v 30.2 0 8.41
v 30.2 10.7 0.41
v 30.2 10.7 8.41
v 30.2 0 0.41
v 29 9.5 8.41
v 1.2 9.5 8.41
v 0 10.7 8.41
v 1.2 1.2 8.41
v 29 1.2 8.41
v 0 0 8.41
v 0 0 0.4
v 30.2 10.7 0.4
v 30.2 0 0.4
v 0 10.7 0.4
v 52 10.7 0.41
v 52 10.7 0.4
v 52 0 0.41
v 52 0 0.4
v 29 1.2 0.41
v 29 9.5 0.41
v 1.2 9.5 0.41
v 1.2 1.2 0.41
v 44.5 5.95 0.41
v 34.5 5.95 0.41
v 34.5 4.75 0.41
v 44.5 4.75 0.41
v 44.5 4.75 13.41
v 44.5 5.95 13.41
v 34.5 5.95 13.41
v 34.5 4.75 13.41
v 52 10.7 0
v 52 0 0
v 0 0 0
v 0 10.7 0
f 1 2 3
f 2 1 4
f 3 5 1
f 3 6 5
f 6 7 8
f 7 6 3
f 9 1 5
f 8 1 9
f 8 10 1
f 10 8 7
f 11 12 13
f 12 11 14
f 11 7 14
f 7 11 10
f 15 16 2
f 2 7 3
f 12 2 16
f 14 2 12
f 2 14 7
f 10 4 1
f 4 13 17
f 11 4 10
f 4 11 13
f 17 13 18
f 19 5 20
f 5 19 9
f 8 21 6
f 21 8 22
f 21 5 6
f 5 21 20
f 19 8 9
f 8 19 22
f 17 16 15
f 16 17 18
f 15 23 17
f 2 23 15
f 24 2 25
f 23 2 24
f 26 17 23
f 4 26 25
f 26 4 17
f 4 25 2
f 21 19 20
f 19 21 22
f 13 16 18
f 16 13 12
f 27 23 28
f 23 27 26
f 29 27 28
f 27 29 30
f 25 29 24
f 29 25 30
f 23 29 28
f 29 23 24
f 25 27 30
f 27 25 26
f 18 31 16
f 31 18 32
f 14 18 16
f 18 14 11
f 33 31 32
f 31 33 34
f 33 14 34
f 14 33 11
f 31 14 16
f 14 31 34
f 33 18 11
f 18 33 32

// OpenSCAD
// file: ../../Base/Rotation.scad
// Fischertechnik Box Foundation
// Geometry Helpers Rotation

include <PlacementOptions.scad>

// getRotatedSpace(space, rotation=NoRotation)
// Rotates the space dependent on the specified rotation

function getRotatedSpace(space, rotation=NoRotation) = [
    (rotation == Rotate90 || rotation == Rotate270) ? space.y : space.x,
    (rotation == Rotate90 || rotation == Rotate270) ? space.x : space.y
];

// Rotates the given space around the fixed left lower corner
// space = the space the children needs as width/depth list [width,depth]
// rotation = 0 Rotate0 degrees, 1 Rotate90 degrees, 2 Rotate180 degrees, 3 Rotate270 degrees (equivalent to -90)

module RotateFix(space, rotation=NoRotation) {
    dy = (rotation == Rotate0 || rotation == Rotate270) ? 0 :
        (rotation == Rotate90) ? space.x :
        space.y;
    dx = (rotation < Rotate180) ? 0 :
        (rotation == Rotate180) ? space.x :
        space.y;
    
    translate([dx, dy, 0])
        rotate([0, 0, rotations[rotation]])
            children();
}
// file: ../../Base/Alignment.scad
// Fischertechnik Box Foundation
// Geometry Helpers Alignment

include <PlacementOptions.scad>

// getAlignedX(elementWidth, spaceWidth, align=AlignRight, offset=0)
// Gets the aligned X offset of an element with the given
// width in the given space.
// elementWidth = The width of the element to positon
// spaceWidth = The space where the element should be aligned
// align = 0 AlignLeft, 1 AlignCenter, 2 AlignRight
// offset = an optional offset from the aligned position. When
// aligned left or centered, then positive values are in X direction.
// When aligned right then positive values are in negative X direction.

function getAlignedX(elementWidth, spaceWidth, align=AlignRight, offset=0) =
    (align == AlignLeft) ?
        offset :
        ((align == AlignCenter) ?
        (spaceWidth - elementWidth)/2 + offset :
        spaceWidth - offset - elementWidth);

// getAlignedY(elementDepth, spaceDepth, align=AlignTop, offset=0)
// Gets the aligned Y offset of an element with the given
// depth in the given space.
// elementDepth = The depth of the element to positon
// spaceDepth = The space where the element should be aligned
// align = 0 AlignBottom, 1 AlignCenter, 2 AlignTop
// offset = an optional offset from the aligned position. When
// aligned bottom or centered, then positive values are in Y direction.
// When aligned top then positive values are in negative Y direction.

function getAlignedY(elementDepth, spaceDepth, align=AlignTop, offset=0) =
    (align == AlignBottom) ?
        offset :
        ((align == AlignCenter) ?
        (spaceDepth - elementDepth)/2 + offset :
        spaceDepth - offset - elementDepth);
// file: ../../Base/Boxes.scad
// Fischertechnik Box Foundation
// Pre-designed Boxes

use <Constants.scad>

include <PlacementOptions.scad>

box190Width = 190;
box190Depth = 130;
box130Width = 130;
box130Depth = 95;

// Values are from an original ec3 box
topBottomDifference = 1.5;
outerHeight = 40;
innerHeight = 38.2;
baseThickness = outerHeight - innerHeight;
stackExcess = 5.7;
radius = 3.5;
wallThickness = 1.5;
tolerance = 0.2;
stackOffset = innerHeight - stackExcess;

boxUsageHeight = stackOffset;
boxWallThickness = wallThickness;
boxBaseThickness = baseThickness;
boxWebWidth = 3.0;

// getBoxWallThickness()
// Gets the wall thickness of a Fischertechnik Box
function getBoxWallThickness() = boxWallThickness;

// getBoxUsageHeight()
// Gets the usable height of a Fischertechnik box
function getBoxUsageHeight() = boxUsageHeight;

// getBoxInnerHeight()
// Gets the inner height of a Fischertechnik box, including the stack excess
function getBoxInnerHeight() = innerHeight;

// getBoxBaseThickness()
// Gets the thickness of the Fischertechnik box base.
function getBoxBaseThickness() = boxBaseThickness;

// getBoxWebWidth()
// Gets the width of a box web
function getBoxWebWidth() = boxWebWidth;

// getBox190Space()
// Gets the usable inner space of a Box 190 as an x/y-list
function getBox190Space() = [
    box190Width - 2*getBoxWallThickness() - topBottomDifference, 
    box190Depth - 2*getBoxWallThickness() - topBottomDifference ];

// BoxBase(width, depth)
// Creates an empty stackable Fischertechnik compatible box
// width = Outer width of the box (190, 130, ...)
// depth = Outer depth of the box (130, 95, ...)

module BoxBase(width, depth, height=outerHeight) {    
    thinPlate = 0.01;

    innerHeight = height - baseThickness;    
    
    module BodyPlate(width, depth) {
        translate([radius, radius])
        hull() {
            w = width-2*radius;
            d = depth-2*radius;
            cube([w, d, thinPlate]);
            cylinder(thinPlate, r=radius, $fn=getFragments());
            translate([w, 0])
                cylinder(thinPlate, r=radius, $fn=getFragments());
            translate([w, d])
                cylinder(thinPlate, r=radius, $fn=getFragments());
            translate([0, d])
                cylinder(thinPlate, r=radius, $fn=getFragments());
        }
    }
    
    module Body(tolerance=tolerance) {
        hull() {
            // Bottom with tolerance to fit into the original boxes when stacked
            translate([-wallThickness+tolerance, -wallThickness+tolerance, -baseThickness])
                BodyPlate(width-topBottomDifference-2*tolerance, depth-topBottomDifference-2*tolerance);
            
            // Top
            translate([-wallThickness-topBottomDifference/2, -wallThickness-topBottomDifference/2, innerHeight-thinPlate])
                BodyPlate(width, depth);
         }
    }

    module Cutoff() {
        hull() {
            coWidth = width - 2*wallThickness;
            coDepth = depth - 2*wallThickness;
            
            // Bottom
            BodyPlate(coWidth-topBottomDifference, coDepth-topBottomDifference);

            // Top
            translate([-topBottomDifference/2, -topBottomDifference/2, innerHeight+thinPlate]) 
                BodyPlate(coWidth, coDepth);
        }
    }
    
    difference() {        
        Body();
        Cutoff();
        stackOffset = innerHeight - stackExcess;
        translate([0, 0, stackOffset + baseThickness])
            Body(tolerance=0);
    }
}

// Creates the Fischertechnik empty box 130x190 mm and places it at position 0,0
// 190x130 are the outer sizes, the inner space is slightly smaller. Use getBox190Space() to get the inner sizes.
// The box is positioned that the usable inner space is at the 0,0,0 position. The

module Box190() {
    BoxBase(box190Width, box190Depth);
}

// Gets the usable inner space of a Box 130 as an x/y-list
function getBox130Space() = [
    box130Width - 2*getBoxWallThickness() - topBottomDifference, 
    box130Depth - 2*getBoxWallThickness() - topBottomDifference ];

// Creates the Fischertechnik empty box 95x130 mm and places it at position 0,0
// 190x130 are the outer sizes, the inner space is slightly smaller. Use getBox190Space() to get the inner sizes.
// The box is positioned that the usable inner space is at the 0,0,0 position. The

module Box130() {
    BoxBase(box130Width, box130Depth);
}

// Creates a web at the specified box walls
// corner 0 = LowerLeft, 1 = UpperLeft, 2 = UpperRight, 3 = LowerRight
// side 0 = LeftOfCorner, 1 = RightOfCorner
// distance = Distance in mm from the corner
// boxSpace = inner width and depth of the box (default: Box 190)
// webWidth = length of the web (default is 3 mms)
// webThickness = thickness of the web (default is 1 mm)

module BoxWeb(corner, side, distance, boxSpace=getBox190Space(), webWidth=getBoxWebWidth(), webThickness=1.0) {
    sink = getBoxWallThickness()/2;

    width = (corner % 2 == 0) ? 
            (side == LeftOfCorner ? webWidth : webThickness) :
            (side == LeftOfCorner ? webThickness : webWidth);

    depth = (corner % 2 == 0) ? 
            (side == RightOfCorner ? webWidth : webThickness) :
            (side == RightOfCorner ? webThickness : webWidth);
    
    xDiff = corner == LowerLeft ? 
                (side == LeftOfCorner ? -sink : distance) :
            (corner == UpperLeft ?                
                (side == LeftOfCorner ? distance : -sink) :
            (corner == UpperRight ?
                (side == LeftOfCorner ? boxSpace.x-webWidth+sink : boxSpace.x-distance-webThickness) :
                (side == LeftOfCorner ? boxSpace.x-distance-webThickness: boxSpace.x-webWidth+sink)));

    yDiff = corner == LowerLeft ? 
                (side == RightOfCorner ? -sink : distance) :
            (corner == UpperLeft ?
                (side == RightOfCorner ? boxSpace.y-distance : boxSpace.y-webWidth+sink) :
            (corner == UpperRight ?
                (side == RightOfCorner ? boxSpace.y-webWidth+sink : boxSpace.y-distance) :
                (side == RightOfCorner ? distance : -sink)));
    
    translate([xDiff, yDiff, -getExcess()])
        cube([width, depth, boxUsageHeight + 2*getExcess()]);
}
// file: ../../Base/PlacementOptions.scad
// Fischertechnik Box Foundation
// Placement Options

// Alignment
NoAlign = 0;
AlignLeft = 1;
AlignBottom = 2;
AlignCenter = 3;
AlignRight = 4;
AlignTop = 5;

// Element rotation degree steps
rotations = [0, -90, -180, -270];

// Rotation
NoRotation = 0;
Rotate0 = 0;
Rotate90 = 1;
Rotate180 = 2;
Rotate270 = 3;

// Docking (seen from above)
NoDock = -1;
DockLeft = 0;
DockTop = 1;
DockRight = 2;
DockCorner = 2;
DockBottom = 3;

// Web corners
LowerLeft = 0;
UpperLeft = 1;
UpperRight = 2;
LowerRight = 3;

// Web position relative to corner
LeftOfCorner = 0;
RightOfCorner = 1;
// file: ../../Base/Placement.scad
// Fischertechnik Box Foundation
// Geometry Helpers Placement

use <Constants.scad>
use <Alignment.scad>
use <Rotation.scad>
use <Boxes.scad>

include <PlacementOptions.scad>

// Place(x=0, y=0, elementSpace=[0,0], alignX=AlignLeft, alignY=AlignBottom, rotation=Rotate0, boxSpace=getBox190Space())
// Places the child at the specified position
// y = Y-Position. This is a relative position when an X aligment is specified.
// x = X-Position. This is a relative position when an Y aligment is specified.
// elementSpace = space of the element to be placed [x,y]
// alignX = -1=NoAlign, 0 AlignLeft, 1 AlignCenter, 3 AlignRight (elementSpace and boxSpace required!)
// alignY = -1=NoAlign, 2 AlignBottom, 1 AlignCenter, 4 AlignTop (elementSpace and boxSpace required!)
// rotation = 0 Rotate0 0 degrees, 1 Rotate90 90 degrees, 
// 2 Rotate180 180 degrees, 3 Rotate270 270 degrees (equivalent to -90)
// boxSpace = Inner space of the box where the placement occurs [x,y] - default is Box 190x130 inner space

module Place(x=0, y=0, elementSpace=[0,0], 
  alignX=AlignLeft, alignY=AlignBottom, 
  rotation=NoRotation, boxSpace=getBox190Space()) {

    module Position(x, y, space, rotation=Rotate0) {
        translate([x, y, 0])
            RotateFix(space, rotation)
                children();
    }

    space = getRotatedSpace(elementSpace, rotation);
    alignedX = getAlignedX(space.x, boxSpace.x, alignX, x);
    alignedY = getAlignedY(space.y, boxSpace.y, alignY, y);
    Position(alignedX, alignedY, elementSpace, rotation)
        children();
}

// Center(space=getBox130Space(), elementSpace=[0,0])
// space = Space where the children is centered. For cylinder use centered=true and no elementSpace.
// elementSpace = space of the element to be centered [x,y]

module Center(space=getBox190Space(), elementSpace=[0,0]) {
    Place(elementSpace=elementSpace, boxSpace=space, alignX=AlignCenter, alignY=AlignCenter)
        children();
}

// CenterHorizontal(width=0, y=0, offset=0, space=getBox130Space())
// width = Width of the element to be placed.
// y = Y position of the element
// offset = Offset from the center position (negative will be left of the center)
// space = Space where the element is placed

module CenterHorizontal(width=0, y=0, offset=0, space=getBox190Space()) {
    Place(x=offset, y=y, elementSpace=[width, 0], boxSpace=space, alignX=AlignCenter)
        children(0);
}

// CenterVertical(depth=0, x=0, offset=0, space=getBox130Space())
// depth = Depth of the element to be placed.
// x = X position of the element
// offset = Offset from the center position (negative will be down of the center)
// space = Space where the element is placed

module CenterVertical(depth=0, x=0, offset=0, space=getBox190Space()) {
    Place(x=x, y=offset, elementSpace=[0, depth], boxSpace=space, alignY=AlignCenter)
        children(0);
}

// getIsVertical(align)
// True if the specified alignment needs a vertical orientation for a divider (AlignRight, AlignLeft)

function getIsVertical(align) = (align == AlignRight || align == AlignLeft);

// getIsHorizontal(align)
// True if the specified alignment needs a horizontal orientation for a divider (AlignTop, AlignBottom)

function getIsHorizontal(align) = (align == AlignTop || align == AlignBottom);
// file: ../../Elements/AxisClip10.scad
// Fischertechnik Box Library
// Axis for clip 10
// 31023

use <../ModelBase/Simple.scad>
use <../Base/Constants.scad>

width = 12;
depth = 12;
height = 23;
upperDiameter = 3.6;
clipHeight = 10;

// getAxisClip10Space()
// Gets the space of a frame for a clip 10 with spring ring (mot2)

function getAxisClip10Space() = [width, depth, height];

// AxisClip10(height, clipHeight)
// Axis for clip 10 with spring ring (mot2)
// height = Height of the complete axis
// clipHeight = Height of the rt for the clip (standard is 10, in mot3 its only 7)

module AxisClip10(height=height, clipHeight=clipHeight) {
    LeveledAxisWithSpace(height, height-clipHeight, getAxisClip10Space(), diameter=upperDiameter);
}

// Tests
color("lightgray")
AxisClip10();
// file: ../../Base/Constants.scad
// Fischertechnik Box Foundation
// Constants

// Constant values necessary for multiple elements

// Base constants
dividerThickness = 1.2;
excess = 0.01;
fragments = 90;
tolerance = 0.8;

// Gets the thickness of a divider 
function getDividerThickness() = dividerThickness;

// Gets the excess that is used to merge walls into each other
function getExcess() = excess;

// Gets amount of fragments of a cylinder
function getFragments() = fragments;

// Gets the inner tolerance of a frame to each side
function getTolerance() = tolerance;


// Fischertechnik specific constants
axisDiameter = 4;
axisBottomDiameter = axisDiameter + 1;
standardEdgeDistance = 2.5;
standardWebDistance = 11.5;
standardCornerLength = 15;
tubeWallFactor = 0.8;
smallPartsFrameHeight = 20;

// Gets axis diameter
function getAxisDiameter() = axisDiameter;

// Gets axis bottom diameter for thicker part at the bottom
function getAxisBottomDiameter() = axisBottomDiameter;

// gets the standard distance to the wall of the box for dockable frames with webs
function getStandardEdgeDistance() = standardEdgeDistance;

// gets the standard distance of each web to the corner of the dockable frame
function getStandardWebDistance() = standardWebDistance;

// gets the standard length of the corner walls of a dockable frame
function getStandardCornerLength() = standardCornerLength;

// gets the wall thickness of a tube.
function getTubeWallThickness() = tubeWallFactor * getDividerThickness();

// gets the frame height for docked small parts boxes.
function getSmallPartsFrameHeight() = smallPartsFrameHeight;
// file: ../../Elements/FrameBracketWithoutWorm.scad
// Fischertechnik Box Library
// Frame  for bracket without worm
// 31046

use <../Base/Constants.scad>
use <../ModelBase/Complex.scad>

// getFrameBracketWithoutWormSpace()
// Gets the space for a frame for a bracket with worm.

function getFrameBracketWithoutWormSpace() = getFrameBracketSpace();

// FrameBracketWithoutWorm()
// Frame for bracket with worm.

module FrameBracketWithoutWorm() {
    FrameBracket([ 10, getDividerThickness(), 13 ]);
}

// Test
color("lightgray")
FrameBracketWithoutWorm();
// file: ../TestPrint.scad
// 3D Print Test Base

use <../Base/Constants.scad>

use <../Elements/AxisClip10.scad>

module TestPrint(elementSpace) {
    cube([elementSpace.x, elementSpace.y, 0.4]);
    translate([0,0,0.4+getExcess()]) {
        children();
    }
}

TestPrint(getAxisClip10Space())
    AxisClip10();
// main file
// 3D Print Test
// FrameBracketWithoutWorm

use <../TestPrint.scad>
use <../../Elements/FrameBracketWithoutWorm.scad>

TestPrint(getFrameBracketWithoutWormSpace())
    FrameBracketWithoutWorm();
